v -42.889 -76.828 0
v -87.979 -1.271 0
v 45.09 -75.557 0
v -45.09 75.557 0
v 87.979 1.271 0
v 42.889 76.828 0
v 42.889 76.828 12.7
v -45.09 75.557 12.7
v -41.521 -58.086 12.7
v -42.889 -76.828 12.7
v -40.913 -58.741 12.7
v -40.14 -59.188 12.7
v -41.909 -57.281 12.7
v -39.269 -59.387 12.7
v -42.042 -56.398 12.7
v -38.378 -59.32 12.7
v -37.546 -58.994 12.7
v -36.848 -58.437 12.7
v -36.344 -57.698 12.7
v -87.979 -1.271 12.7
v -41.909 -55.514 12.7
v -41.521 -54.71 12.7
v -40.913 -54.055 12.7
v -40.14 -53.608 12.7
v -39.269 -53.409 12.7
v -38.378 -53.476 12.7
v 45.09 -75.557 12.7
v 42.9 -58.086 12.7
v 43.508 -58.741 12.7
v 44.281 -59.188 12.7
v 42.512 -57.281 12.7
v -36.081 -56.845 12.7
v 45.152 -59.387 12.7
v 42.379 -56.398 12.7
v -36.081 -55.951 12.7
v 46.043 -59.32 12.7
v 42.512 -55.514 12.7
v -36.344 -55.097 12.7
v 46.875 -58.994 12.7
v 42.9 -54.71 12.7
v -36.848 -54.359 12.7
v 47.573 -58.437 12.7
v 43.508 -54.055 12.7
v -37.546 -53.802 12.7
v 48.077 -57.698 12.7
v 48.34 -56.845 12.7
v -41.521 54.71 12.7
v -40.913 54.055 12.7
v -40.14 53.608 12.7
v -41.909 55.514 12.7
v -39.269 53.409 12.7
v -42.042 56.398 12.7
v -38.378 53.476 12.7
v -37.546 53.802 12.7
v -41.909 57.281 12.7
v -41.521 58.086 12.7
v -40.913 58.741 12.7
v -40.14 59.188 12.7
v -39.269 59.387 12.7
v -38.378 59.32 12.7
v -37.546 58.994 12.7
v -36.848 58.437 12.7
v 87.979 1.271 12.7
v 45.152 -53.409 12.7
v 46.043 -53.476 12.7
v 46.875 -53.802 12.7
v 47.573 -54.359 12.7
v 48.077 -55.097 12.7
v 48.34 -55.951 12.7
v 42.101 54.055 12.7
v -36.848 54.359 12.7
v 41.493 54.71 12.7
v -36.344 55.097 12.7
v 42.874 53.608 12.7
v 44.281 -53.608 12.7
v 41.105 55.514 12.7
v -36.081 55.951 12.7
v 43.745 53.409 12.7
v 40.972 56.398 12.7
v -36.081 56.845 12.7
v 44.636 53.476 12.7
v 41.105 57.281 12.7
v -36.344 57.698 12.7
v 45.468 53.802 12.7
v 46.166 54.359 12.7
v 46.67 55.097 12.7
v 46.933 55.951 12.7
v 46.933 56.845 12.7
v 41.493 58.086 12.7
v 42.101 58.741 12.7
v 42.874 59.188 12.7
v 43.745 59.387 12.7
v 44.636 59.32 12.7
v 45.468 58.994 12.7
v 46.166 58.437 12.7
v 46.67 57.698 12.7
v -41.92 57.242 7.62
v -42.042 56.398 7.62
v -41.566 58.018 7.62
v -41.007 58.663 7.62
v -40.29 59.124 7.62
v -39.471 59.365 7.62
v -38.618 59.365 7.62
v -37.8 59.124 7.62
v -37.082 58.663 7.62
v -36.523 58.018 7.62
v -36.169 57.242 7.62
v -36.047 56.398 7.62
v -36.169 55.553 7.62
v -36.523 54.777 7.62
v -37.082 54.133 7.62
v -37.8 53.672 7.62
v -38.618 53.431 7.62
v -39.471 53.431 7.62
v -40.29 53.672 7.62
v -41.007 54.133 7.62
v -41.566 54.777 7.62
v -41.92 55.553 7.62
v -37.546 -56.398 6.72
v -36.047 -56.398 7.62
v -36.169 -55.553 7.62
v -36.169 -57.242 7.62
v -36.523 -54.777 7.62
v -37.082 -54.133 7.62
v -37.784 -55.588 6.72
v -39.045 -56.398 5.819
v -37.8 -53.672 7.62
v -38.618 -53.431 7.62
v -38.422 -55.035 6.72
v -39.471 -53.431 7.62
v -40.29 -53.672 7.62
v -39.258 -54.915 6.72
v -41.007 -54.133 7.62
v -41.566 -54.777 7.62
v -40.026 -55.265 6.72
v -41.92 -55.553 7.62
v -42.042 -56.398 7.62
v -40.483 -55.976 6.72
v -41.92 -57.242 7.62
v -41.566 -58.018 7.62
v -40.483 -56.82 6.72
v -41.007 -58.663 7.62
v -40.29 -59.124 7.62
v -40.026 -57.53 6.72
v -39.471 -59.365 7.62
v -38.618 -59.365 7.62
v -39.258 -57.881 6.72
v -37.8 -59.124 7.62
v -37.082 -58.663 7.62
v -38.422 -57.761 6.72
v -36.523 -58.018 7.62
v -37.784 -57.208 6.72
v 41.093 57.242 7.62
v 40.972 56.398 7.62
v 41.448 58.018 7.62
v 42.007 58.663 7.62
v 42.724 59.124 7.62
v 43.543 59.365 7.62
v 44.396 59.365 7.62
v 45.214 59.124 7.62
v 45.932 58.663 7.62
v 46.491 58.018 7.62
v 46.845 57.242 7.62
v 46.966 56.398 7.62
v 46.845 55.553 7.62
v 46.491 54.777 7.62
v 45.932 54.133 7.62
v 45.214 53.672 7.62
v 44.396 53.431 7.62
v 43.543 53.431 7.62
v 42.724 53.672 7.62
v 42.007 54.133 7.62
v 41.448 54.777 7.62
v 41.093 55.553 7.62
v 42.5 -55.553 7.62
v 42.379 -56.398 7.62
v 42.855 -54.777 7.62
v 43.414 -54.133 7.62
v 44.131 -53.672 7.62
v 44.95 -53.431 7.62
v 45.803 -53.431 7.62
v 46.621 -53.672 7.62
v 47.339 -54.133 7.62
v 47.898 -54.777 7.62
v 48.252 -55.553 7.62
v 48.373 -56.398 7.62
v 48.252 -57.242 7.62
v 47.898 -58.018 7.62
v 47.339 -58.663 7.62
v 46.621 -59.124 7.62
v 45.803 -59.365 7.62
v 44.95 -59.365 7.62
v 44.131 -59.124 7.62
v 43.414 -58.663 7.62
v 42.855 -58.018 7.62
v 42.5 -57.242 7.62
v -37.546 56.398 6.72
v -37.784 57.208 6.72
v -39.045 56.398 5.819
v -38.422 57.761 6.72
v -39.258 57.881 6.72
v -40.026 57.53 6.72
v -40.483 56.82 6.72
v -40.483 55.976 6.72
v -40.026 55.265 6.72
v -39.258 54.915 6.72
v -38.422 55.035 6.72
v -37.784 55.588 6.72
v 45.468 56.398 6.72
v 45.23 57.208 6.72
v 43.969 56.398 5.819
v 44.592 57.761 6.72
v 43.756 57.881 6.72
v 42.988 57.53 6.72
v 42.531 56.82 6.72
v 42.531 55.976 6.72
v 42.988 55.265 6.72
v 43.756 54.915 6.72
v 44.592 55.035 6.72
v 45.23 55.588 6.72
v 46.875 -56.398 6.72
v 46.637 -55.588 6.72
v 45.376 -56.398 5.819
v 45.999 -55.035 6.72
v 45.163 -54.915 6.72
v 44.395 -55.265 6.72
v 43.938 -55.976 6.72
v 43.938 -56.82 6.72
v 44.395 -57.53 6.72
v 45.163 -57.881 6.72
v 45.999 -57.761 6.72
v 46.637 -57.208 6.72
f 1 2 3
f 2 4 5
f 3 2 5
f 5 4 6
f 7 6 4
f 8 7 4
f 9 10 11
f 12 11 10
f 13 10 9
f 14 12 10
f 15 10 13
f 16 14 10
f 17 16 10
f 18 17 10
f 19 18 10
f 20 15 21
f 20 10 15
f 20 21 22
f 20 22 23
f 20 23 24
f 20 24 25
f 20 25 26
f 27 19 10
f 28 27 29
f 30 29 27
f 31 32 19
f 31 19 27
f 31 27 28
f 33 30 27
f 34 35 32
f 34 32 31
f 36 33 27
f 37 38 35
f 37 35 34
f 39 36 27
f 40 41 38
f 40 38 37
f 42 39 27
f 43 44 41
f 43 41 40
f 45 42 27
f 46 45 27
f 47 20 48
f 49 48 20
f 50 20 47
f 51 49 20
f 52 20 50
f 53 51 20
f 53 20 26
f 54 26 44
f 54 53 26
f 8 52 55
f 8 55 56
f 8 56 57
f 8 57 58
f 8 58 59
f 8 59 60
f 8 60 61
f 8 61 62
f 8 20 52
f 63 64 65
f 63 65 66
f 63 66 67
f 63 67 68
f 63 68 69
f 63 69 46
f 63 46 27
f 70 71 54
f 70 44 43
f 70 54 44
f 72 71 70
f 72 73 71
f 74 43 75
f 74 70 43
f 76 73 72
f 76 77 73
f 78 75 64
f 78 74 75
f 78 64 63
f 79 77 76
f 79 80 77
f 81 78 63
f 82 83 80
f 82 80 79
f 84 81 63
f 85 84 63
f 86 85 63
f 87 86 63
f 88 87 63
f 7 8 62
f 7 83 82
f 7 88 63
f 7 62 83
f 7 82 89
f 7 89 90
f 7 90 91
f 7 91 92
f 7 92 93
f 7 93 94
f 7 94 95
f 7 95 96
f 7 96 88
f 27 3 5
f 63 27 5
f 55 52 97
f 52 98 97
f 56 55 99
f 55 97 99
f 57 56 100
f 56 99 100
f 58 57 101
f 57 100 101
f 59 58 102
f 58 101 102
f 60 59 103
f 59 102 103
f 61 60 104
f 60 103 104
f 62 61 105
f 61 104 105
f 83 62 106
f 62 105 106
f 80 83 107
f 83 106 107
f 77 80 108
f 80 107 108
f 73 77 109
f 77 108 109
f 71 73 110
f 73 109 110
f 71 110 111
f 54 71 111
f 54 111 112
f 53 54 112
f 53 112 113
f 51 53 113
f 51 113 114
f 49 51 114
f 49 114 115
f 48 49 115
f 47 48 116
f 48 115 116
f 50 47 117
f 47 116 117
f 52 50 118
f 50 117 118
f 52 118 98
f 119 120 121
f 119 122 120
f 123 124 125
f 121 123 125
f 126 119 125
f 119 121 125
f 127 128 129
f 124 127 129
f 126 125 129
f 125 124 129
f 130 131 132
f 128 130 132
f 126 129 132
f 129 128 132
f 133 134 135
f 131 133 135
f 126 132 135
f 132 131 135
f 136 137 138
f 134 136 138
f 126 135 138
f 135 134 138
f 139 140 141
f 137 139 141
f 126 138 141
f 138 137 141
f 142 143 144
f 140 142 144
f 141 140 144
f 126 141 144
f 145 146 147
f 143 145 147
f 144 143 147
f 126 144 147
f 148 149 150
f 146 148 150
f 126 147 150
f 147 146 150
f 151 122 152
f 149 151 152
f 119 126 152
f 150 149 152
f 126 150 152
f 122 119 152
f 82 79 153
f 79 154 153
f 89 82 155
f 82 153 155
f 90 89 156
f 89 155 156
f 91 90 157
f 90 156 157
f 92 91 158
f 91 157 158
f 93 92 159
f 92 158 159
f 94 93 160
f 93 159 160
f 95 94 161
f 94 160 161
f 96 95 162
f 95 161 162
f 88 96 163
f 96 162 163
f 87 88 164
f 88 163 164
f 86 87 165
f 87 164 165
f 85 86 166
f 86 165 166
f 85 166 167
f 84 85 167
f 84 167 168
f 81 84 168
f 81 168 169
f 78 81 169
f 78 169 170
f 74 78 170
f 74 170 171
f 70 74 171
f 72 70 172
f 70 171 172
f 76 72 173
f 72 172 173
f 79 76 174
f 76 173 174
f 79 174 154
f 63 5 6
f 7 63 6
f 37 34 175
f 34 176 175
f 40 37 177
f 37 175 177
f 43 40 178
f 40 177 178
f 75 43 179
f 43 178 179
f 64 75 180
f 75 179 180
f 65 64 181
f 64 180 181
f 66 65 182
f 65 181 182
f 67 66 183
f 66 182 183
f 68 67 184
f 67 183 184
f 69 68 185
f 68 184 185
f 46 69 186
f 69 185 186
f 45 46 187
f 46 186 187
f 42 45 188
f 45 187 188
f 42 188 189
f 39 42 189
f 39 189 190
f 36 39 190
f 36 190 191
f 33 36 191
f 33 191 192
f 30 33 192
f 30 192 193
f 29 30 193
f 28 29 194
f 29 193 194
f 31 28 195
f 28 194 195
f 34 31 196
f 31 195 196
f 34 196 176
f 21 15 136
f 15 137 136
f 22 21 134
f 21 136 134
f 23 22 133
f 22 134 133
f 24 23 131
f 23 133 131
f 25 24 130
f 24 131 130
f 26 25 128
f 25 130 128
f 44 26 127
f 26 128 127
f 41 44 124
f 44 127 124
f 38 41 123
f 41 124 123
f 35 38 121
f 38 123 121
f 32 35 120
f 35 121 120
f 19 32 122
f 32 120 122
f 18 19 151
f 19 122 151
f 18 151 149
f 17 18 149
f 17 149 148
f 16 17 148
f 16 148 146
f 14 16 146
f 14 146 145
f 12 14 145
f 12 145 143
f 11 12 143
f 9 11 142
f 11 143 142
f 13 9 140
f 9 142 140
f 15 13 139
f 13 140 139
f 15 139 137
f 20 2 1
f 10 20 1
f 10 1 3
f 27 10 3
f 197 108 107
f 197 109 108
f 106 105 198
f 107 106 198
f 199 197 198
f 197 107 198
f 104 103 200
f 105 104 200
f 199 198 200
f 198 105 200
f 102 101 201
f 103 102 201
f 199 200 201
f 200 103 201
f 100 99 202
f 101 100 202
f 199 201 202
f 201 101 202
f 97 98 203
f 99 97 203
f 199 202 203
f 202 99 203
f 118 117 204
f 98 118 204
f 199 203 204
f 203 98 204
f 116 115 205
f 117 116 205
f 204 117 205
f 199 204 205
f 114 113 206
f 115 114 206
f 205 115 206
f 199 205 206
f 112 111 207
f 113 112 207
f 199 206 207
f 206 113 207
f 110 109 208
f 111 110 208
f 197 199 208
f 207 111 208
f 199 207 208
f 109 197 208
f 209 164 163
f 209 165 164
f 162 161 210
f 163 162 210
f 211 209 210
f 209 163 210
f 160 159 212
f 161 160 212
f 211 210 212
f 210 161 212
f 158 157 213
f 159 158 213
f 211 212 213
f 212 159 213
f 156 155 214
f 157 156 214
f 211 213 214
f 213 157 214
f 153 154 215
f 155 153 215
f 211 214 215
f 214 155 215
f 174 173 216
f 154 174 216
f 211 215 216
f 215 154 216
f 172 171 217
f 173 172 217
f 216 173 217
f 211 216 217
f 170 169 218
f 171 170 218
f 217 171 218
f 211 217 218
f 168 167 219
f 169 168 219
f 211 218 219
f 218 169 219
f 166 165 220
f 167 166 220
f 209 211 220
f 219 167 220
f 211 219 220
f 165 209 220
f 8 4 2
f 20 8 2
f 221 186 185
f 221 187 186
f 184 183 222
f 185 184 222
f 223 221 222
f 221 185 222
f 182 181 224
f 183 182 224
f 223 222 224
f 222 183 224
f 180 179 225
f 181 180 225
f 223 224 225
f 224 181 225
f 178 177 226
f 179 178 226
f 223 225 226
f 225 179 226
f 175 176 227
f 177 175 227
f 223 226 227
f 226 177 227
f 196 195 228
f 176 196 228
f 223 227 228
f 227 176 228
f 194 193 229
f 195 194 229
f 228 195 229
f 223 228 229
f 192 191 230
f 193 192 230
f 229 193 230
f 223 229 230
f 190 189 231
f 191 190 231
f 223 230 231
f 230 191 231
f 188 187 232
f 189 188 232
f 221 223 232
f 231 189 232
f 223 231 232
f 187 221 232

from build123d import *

# Parameters (mm, degrees)
F1_DEPTH = 12.7
F3_D     = 5.9944
F3_DEPTH = 5.08
F3_TIP   = 1.8008994473


with BuildPart() as f1:
    # F0 (on Top) → F1 (new body)
    with BuildSketch(Plane.XY):
        Polygon((45.0902102752, -75.5565545624), (87.979000811, 1.2709902791), (42.8887905359, 76.8275448415), (-45.0902102752, 75.5565545624), (-87.979000811, -1.2709902791), (-42.8887905359, -76.8275448415), align=None)
    extrude(amount=F1_DEPTH)

    # F3
    with Locations(Plane.XY.offset(12.7)):
        with Locations((-39.0446968377, 56.39789626), (43.9692549407, 56.39789626), (-39.0446968377, -56.39789626), (45.3762710094, -56.39789626)):
            Hole(F3_D / 2, depth=F3_DEPTH)
            with Locations((0, 0, -(F3_DEPTH + F3_TIP / 2))):  # 118° drill point
                Cone(0, F3_D / 2, F3_TIP, mode=Mode.SUBTRACT)


solid = f1.part
